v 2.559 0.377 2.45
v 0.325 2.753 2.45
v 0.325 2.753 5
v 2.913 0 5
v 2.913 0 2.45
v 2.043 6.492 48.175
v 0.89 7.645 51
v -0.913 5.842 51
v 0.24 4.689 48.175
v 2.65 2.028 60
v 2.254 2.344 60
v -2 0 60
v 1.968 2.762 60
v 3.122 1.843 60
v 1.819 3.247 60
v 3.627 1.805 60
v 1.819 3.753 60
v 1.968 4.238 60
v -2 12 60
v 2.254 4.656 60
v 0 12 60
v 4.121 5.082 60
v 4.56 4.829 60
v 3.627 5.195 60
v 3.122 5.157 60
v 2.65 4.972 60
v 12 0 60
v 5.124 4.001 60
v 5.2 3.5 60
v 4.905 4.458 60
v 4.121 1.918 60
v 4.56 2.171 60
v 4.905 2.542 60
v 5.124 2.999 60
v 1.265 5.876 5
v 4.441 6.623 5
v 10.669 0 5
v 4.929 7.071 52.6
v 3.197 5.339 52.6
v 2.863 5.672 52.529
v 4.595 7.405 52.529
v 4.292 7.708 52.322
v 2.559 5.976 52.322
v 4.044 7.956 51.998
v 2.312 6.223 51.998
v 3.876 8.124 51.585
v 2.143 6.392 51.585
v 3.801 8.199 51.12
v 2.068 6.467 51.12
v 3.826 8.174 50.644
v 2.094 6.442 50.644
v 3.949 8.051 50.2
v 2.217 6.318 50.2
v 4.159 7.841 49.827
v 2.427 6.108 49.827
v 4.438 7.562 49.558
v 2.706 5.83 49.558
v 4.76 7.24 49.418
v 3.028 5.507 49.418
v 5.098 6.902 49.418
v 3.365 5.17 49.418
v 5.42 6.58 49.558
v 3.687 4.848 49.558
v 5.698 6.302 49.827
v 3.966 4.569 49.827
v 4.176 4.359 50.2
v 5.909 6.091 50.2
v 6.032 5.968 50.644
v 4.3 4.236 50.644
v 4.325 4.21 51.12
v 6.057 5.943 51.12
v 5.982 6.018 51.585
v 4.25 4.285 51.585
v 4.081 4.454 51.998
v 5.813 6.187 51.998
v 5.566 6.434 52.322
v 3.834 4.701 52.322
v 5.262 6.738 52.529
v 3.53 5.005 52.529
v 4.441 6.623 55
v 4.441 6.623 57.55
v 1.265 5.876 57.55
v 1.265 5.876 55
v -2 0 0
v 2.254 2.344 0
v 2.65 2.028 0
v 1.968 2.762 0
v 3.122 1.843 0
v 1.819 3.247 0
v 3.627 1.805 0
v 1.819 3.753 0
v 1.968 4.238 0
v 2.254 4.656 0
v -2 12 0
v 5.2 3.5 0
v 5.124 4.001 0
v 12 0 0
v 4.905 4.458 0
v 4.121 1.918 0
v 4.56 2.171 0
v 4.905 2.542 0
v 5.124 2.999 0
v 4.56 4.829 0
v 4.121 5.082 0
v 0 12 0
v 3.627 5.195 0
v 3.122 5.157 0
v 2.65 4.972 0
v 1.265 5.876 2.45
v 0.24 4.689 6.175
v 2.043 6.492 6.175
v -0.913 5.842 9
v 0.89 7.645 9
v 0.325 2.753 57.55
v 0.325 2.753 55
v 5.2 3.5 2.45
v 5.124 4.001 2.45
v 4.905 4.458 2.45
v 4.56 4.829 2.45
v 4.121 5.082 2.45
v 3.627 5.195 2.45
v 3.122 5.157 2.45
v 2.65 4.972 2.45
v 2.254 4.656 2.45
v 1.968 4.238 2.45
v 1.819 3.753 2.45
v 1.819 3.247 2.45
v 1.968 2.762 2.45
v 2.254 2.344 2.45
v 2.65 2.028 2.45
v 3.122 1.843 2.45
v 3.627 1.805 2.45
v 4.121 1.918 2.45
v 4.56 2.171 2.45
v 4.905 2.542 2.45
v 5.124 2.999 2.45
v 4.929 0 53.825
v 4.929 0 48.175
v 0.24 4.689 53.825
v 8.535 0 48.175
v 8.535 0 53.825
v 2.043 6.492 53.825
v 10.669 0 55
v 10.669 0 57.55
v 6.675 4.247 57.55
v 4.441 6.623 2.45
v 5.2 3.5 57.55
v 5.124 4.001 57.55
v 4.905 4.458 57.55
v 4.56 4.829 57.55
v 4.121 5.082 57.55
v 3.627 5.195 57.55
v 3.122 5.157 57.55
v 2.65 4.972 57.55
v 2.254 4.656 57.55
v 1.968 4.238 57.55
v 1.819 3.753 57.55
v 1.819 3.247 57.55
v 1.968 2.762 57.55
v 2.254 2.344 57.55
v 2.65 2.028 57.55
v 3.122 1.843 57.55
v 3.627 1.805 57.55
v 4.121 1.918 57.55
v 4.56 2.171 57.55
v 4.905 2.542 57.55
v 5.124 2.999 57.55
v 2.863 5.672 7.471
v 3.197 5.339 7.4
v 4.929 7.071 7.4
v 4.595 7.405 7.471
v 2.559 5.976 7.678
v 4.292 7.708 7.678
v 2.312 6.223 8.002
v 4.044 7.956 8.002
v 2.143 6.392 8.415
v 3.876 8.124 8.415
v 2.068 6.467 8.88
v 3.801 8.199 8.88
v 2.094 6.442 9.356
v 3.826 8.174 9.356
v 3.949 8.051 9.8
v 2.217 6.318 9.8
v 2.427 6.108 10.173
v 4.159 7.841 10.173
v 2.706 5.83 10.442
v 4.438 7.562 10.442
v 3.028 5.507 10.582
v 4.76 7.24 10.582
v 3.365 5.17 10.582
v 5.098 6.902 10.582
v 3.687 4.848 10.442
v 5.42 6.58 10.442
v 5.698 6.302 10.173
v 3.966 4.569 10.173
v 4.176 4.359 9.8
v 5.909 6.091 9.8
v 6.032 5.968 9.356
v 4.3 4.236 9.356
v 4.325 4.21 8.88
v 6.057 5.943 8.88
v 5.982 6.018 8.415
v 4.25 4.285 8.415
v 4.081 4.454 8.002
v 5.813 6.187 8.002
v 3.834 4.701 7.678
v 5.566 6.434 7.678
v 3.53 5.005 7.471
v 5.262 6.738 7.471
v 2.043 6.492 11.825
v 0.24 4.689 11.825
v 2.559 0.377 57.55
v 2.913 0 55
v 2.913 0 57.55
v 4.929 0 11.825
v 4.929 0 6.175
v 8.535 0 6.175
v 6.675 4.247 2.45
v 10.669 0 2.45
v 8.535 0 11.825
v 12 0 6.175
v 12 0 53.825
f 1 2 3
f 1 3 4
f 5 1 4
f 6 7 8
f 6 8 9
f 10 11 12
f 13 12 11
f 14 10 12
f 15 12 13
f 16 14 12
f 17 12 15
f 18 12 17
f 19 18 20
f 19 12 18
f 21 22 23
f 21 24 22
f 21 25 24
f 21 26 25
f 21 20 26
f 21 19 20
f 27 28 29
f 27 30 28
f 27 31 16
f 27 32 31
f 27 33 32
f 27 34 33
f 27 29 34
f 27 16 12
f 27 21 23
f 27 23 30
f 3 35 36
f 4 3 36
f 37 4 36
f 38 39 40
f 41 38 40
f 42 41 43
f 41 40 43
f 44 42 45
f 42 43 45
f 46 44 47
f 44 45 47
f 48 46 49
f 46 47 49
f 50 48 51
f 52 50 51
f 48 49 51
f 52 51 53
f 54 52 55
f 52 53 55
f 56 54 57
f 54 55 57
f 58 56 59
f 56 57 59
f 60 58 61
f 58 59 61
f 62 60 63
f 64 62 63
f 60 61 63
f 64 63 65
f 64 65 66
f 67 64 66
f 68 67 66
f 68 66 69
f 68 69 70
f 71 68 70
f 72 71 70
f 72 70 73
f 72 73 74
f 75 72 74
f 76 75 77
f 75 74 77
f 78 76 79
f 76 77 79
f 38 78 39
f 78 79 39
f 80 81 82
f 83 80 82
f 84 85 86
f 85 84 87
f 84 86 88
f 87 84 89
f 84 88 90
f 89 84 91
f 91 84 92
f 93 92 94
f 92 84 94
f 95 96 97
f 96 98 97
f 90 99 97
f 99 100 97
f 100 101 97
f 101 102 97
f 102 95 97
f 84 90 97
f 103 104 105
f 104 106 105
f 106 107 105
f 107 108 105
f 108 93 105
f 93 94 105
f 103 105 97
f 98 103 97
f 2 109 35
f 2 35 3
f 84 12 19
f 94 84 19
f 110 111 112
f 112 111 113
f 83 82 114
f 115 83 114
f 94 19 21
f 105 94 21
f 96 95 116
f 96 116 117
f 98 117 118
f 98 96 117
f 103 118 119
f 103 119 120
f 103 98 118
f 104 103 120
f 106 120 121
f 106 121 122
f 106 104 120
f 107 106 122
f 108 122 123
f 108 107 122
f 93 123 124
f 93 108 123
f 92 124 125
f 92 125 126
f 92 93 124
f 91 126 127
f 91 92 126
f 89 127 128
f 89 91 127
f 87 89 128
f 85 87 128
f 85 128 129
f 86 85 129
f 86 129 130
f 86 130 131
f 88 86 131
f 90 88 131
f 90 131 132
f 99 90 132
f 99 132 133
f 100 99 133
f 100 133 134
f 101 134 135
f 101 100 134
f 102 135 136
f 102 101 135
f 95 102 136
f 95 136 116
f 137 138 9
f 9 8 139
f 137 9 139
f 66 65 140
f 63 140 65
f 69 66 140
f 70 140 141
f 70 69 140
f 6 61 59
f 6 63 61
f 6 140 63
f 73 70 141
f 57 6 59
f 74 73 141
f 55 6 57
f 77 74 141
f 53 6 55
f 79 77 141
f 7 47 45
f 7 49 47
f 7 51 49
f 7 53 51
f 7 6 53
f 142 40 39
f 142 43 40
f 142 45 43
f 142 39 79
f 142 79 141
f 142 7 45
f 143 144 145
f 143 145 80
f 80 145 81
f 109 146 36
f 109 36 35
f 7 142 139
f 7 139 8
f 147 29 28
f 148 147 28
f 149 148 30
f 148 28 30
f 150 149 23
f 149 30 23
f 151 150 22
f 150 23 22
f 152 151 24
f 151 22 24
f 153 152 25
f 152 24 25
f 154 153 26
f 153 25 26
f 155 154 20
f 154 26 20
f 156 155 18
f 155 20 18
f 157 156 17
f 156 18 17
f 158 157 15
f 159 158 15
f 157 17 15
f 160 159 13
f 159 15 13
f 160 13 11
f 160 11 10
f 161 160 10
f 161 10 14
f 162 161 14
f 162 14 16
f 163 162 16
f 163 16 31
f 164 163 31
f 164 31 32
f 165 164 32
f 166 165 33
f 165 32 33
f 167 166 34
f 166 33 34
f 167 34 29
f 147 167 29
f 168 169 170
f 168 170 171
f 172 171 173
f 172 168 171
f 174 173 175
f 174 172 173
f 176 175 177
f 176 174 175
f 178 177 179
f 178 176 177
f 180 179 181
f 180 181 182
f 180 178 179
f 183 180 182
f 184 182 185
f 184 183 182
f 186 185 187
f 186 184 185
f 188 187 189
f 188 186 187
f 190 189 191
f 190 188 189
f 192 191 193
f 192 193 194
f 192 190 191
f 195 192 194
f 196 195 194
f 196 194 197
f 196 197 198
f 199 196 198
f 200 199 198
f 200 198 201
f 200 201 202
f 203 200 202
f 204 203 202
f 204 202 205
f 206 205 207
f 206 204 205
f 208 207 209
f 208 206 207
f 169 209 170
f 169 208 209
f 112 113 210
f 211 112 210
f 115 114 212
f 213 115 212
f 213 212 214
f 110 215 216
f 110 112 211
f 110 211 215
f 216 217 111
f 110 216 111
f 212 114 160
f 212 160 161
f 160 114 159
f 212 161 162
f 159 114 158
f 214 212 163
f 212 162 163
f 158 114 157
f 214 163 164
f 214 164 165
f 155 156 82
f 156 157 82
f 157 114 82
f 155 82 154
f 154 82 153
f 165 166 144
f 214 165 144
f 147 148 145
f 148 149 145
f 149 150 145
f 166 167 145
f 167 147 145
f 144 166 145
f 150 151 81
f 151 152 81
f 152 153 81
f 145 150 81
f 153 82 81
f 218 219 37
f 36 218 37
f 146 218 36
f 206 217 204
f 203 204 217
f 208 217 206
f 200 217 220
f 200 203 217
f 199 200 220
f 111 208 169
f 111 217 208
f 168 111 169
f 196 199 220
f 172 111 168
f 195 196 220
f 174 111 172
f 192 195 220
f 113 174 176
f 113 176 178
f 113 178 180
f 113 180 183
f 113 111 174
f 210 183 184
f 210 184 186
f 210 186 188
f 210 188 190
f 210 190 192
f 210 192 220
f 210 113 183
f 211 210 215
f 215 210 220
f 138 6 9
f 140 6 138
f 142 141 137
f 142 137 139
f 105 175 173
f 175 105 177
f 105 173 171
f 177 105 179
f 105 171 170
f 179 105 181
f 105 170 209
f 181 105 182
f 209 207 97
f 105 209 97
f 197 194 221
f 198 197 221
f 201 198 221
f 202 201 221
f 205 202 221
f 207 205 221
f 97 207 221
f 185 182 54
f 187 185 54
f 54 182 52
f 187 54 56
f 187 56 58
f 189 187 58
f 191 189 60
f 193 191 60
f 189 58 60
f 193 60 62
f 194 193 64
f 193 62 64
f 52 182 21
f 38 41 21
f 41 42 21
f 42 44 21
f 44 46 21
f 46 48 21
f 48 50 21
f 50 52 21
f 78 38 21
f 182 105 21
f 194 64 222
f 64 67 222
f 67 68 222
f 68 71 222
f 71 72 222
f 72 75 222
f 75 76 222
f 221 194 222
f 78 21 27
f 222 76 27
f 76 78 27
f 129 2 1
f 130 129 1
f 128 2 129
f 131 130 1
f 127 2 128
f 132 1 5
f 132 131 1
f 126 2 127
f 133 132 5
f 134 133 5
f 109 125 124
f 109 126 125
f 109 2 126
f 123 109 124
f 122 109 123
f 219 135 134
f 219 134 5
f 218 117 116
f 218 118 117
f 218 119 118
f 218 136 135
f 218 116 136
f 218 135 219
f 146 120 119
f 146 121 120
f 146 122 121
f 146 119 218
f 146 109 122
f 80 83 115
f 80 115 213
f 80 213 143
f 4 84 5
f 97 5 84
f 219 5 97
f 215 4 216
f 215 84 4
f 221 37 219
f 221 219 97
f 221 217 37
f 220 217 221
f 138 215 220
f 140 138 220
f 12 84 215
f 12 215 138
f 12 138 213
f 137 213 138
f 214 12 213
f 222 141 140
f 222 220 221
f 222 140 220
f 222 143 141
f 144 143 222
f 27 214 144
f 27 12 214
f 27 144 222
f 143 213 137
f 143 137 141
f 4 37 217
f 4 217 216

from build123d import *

# Parameters (mm, degrees)
BOSS_EXTRUDE1_DEPTH     = 30
SKETCH1_13_W            = 2
SKETCH1_13_H            = 12
BOSS_EXTRUDE6_DEPTH     = 30
CUT_EXTRUDE3_DEPTH      = 5
BOSS_EXTRUDE4_START     = -2.45
BOSS_EXTRUDE4_OUTLINE_W = 30
BOSS_EXTRUDE4_OUTLINE_H = 14.485281374
BOSS_EXTRUDE4_OUTLINE_R = 1.6
BOSS_EXTRUDE4_DEPTH     = 2.45
CUT_EXTRUDE1_DEPTH      = 5
SKETCH1_10_R            = 1.7
BOSS_EXTRUDE5_DEPTH     = 2.45
CUT_EXTRUDE4_DEPTH      = 63.353829072


# Read off the part's stored shape, not the designer's step: Boss-Extrude4
with BuildPart() as part:
    # Sketch1 → Boss-Extrude1 (new body)
    with BuildSketch(Plane.XY):
        Polygon((0, 12), (12, 0), (0, 0), align=None)
    boss_extrude1 = extrude(amount=BOSS_EXTRUDE1_DEPTH)

    # Sketch1<13> → Boss-Extrude6 (add)
    with BuildSketch(Plane.XY):
        with Locations((-1, 6)):
            Rectangle(SKETCH1_13_W, SKETCH1_13_H)
    boss_extrude6 = extrude(amount=BOSS_EXTRUDE6_DEPTH)

    # Sketch4 → Cut-Extrude3 (cut)
    with BuildSketch(Plane(origin=(6, 6, 0), x_dir=(0, 0, -1), z_dir=(0.7071067811865477, 0.7071067811865475, 0))):
        Polygon((-6.175, -8.485281374), (-6.175, 3.145733136), (-9, 4.776747647), (-11.825, 3.145733136), (-11.825, -8.485281374), align=None)
    cut_extrude3 = extrude(amount=-CUT_EXTRUDE3_DEPTH, mode=Mode.SUBTRACT)

    # Boss-Extrude4 outline → Boss-Extrude4 (add)
    with BuildSketch(Plane(origin=(6, 6, 0), x_dir=(0, 0, -1), z_dir=(0.7071067811865477, 0.7071067811865475, 0)).offset(BOSS_EXTRUDE4_START)):
        with Locations((-15, -1.242640687)):
            Rectangle(BOSS_EXTRUDE4_OUTLINE_W, BOSS_EXTRUDE4_OUTLINE_H)
        with Locations((-9, 1.514718626)):
            Circle(BOSS_EXTRUDE4_OUTLINE_R, mode=Mode.SUBTRACT)
    boss_extrude4 = extrude(amount=BOSS_EXTRUDE4_DEPTH)

    # Sketch1<4> → Cut-Extrude1 (cut)
    with BuildSketch(Plane.XY):
        Polygon((10.669337222, 0), (4.440608352, 6.623473909), (1.265296423, 5.876327682), (0.324688071, 2.752853773), (2.91347758, 0), align=None)
    cut_extrude1 = extrude(amount=CUT_EXTRUDE1_DEPTH, mode=Mode.SUBTRACT)

    # Sketch1<10> → Boss-Extrude5 (add)
    # profile 1 of 2: a face of its own
    with BuildSketch(Plane.XY):
        Polygon((2.559391648, 0.376526091), (5.734703577, 1.123672318), (6.675311929, 4.247146227), (4.440608352, 6.623473909), (1.265296423, 5.876327682), (0.324688071, 2.752853773), align=None)
        with Locations((3.5, 3.5)):
            Circle(SKETCH1_10_R, mode=Mode.SUBTRACT)
    # profile 2 of 2: a face of its own
    with BuildSketch(Plane.XY):
        Polygon((3.5, 0), (10.669337222, 0), (6.675311929, 4.247146227), (5.734703577, 1.123672318), (2.559391648, 0.376526091), (2.91347758, 0), align=None)
    boss_extrude5 = extrude(amount=BOSS_EXTRUDE5_DEPTH)

    # Mirror1: Boss-Extrude1, Boss-Extrude6, Cut-Extrude3, Boss-Extrude4, Cut-Extrude1, Boss-Extrude5 across plane
    add(boss_extrude1.mirror(Plane.XY.offset(30)))
    add(boss_extrude6.mirror(Plane.XY.offset(30)))
    add(cut_extrude3.mirror(Plane.XY.offset(30)), mode=Mode.SUBTRACT)
    add(boss_extrude4.mirror(Plane.XY.offset(30)))
    add(cut_extrude1.mirror(Plane.XY.offset(30)), mode=Mode.SUBTRACT)
    add(boss_extrude5.mirror(Plane.XY.offset(30)))

    # Sketch1<12> → Cut-Extrude4 (cut, through all)
    with BuildSketch(Plane.XY):
        Polygon((12, -3.5), (12, 0), (10.669337222, 0), (3.5, 0), (2.91347758, 0), (1.441458618, 0), (0, 0), (0, -3.5), align=None)
    extrude(amount=CUT_EXTRUDE4_DEPTH, mode=Mode.SUBTRACT)


solid = part.part
